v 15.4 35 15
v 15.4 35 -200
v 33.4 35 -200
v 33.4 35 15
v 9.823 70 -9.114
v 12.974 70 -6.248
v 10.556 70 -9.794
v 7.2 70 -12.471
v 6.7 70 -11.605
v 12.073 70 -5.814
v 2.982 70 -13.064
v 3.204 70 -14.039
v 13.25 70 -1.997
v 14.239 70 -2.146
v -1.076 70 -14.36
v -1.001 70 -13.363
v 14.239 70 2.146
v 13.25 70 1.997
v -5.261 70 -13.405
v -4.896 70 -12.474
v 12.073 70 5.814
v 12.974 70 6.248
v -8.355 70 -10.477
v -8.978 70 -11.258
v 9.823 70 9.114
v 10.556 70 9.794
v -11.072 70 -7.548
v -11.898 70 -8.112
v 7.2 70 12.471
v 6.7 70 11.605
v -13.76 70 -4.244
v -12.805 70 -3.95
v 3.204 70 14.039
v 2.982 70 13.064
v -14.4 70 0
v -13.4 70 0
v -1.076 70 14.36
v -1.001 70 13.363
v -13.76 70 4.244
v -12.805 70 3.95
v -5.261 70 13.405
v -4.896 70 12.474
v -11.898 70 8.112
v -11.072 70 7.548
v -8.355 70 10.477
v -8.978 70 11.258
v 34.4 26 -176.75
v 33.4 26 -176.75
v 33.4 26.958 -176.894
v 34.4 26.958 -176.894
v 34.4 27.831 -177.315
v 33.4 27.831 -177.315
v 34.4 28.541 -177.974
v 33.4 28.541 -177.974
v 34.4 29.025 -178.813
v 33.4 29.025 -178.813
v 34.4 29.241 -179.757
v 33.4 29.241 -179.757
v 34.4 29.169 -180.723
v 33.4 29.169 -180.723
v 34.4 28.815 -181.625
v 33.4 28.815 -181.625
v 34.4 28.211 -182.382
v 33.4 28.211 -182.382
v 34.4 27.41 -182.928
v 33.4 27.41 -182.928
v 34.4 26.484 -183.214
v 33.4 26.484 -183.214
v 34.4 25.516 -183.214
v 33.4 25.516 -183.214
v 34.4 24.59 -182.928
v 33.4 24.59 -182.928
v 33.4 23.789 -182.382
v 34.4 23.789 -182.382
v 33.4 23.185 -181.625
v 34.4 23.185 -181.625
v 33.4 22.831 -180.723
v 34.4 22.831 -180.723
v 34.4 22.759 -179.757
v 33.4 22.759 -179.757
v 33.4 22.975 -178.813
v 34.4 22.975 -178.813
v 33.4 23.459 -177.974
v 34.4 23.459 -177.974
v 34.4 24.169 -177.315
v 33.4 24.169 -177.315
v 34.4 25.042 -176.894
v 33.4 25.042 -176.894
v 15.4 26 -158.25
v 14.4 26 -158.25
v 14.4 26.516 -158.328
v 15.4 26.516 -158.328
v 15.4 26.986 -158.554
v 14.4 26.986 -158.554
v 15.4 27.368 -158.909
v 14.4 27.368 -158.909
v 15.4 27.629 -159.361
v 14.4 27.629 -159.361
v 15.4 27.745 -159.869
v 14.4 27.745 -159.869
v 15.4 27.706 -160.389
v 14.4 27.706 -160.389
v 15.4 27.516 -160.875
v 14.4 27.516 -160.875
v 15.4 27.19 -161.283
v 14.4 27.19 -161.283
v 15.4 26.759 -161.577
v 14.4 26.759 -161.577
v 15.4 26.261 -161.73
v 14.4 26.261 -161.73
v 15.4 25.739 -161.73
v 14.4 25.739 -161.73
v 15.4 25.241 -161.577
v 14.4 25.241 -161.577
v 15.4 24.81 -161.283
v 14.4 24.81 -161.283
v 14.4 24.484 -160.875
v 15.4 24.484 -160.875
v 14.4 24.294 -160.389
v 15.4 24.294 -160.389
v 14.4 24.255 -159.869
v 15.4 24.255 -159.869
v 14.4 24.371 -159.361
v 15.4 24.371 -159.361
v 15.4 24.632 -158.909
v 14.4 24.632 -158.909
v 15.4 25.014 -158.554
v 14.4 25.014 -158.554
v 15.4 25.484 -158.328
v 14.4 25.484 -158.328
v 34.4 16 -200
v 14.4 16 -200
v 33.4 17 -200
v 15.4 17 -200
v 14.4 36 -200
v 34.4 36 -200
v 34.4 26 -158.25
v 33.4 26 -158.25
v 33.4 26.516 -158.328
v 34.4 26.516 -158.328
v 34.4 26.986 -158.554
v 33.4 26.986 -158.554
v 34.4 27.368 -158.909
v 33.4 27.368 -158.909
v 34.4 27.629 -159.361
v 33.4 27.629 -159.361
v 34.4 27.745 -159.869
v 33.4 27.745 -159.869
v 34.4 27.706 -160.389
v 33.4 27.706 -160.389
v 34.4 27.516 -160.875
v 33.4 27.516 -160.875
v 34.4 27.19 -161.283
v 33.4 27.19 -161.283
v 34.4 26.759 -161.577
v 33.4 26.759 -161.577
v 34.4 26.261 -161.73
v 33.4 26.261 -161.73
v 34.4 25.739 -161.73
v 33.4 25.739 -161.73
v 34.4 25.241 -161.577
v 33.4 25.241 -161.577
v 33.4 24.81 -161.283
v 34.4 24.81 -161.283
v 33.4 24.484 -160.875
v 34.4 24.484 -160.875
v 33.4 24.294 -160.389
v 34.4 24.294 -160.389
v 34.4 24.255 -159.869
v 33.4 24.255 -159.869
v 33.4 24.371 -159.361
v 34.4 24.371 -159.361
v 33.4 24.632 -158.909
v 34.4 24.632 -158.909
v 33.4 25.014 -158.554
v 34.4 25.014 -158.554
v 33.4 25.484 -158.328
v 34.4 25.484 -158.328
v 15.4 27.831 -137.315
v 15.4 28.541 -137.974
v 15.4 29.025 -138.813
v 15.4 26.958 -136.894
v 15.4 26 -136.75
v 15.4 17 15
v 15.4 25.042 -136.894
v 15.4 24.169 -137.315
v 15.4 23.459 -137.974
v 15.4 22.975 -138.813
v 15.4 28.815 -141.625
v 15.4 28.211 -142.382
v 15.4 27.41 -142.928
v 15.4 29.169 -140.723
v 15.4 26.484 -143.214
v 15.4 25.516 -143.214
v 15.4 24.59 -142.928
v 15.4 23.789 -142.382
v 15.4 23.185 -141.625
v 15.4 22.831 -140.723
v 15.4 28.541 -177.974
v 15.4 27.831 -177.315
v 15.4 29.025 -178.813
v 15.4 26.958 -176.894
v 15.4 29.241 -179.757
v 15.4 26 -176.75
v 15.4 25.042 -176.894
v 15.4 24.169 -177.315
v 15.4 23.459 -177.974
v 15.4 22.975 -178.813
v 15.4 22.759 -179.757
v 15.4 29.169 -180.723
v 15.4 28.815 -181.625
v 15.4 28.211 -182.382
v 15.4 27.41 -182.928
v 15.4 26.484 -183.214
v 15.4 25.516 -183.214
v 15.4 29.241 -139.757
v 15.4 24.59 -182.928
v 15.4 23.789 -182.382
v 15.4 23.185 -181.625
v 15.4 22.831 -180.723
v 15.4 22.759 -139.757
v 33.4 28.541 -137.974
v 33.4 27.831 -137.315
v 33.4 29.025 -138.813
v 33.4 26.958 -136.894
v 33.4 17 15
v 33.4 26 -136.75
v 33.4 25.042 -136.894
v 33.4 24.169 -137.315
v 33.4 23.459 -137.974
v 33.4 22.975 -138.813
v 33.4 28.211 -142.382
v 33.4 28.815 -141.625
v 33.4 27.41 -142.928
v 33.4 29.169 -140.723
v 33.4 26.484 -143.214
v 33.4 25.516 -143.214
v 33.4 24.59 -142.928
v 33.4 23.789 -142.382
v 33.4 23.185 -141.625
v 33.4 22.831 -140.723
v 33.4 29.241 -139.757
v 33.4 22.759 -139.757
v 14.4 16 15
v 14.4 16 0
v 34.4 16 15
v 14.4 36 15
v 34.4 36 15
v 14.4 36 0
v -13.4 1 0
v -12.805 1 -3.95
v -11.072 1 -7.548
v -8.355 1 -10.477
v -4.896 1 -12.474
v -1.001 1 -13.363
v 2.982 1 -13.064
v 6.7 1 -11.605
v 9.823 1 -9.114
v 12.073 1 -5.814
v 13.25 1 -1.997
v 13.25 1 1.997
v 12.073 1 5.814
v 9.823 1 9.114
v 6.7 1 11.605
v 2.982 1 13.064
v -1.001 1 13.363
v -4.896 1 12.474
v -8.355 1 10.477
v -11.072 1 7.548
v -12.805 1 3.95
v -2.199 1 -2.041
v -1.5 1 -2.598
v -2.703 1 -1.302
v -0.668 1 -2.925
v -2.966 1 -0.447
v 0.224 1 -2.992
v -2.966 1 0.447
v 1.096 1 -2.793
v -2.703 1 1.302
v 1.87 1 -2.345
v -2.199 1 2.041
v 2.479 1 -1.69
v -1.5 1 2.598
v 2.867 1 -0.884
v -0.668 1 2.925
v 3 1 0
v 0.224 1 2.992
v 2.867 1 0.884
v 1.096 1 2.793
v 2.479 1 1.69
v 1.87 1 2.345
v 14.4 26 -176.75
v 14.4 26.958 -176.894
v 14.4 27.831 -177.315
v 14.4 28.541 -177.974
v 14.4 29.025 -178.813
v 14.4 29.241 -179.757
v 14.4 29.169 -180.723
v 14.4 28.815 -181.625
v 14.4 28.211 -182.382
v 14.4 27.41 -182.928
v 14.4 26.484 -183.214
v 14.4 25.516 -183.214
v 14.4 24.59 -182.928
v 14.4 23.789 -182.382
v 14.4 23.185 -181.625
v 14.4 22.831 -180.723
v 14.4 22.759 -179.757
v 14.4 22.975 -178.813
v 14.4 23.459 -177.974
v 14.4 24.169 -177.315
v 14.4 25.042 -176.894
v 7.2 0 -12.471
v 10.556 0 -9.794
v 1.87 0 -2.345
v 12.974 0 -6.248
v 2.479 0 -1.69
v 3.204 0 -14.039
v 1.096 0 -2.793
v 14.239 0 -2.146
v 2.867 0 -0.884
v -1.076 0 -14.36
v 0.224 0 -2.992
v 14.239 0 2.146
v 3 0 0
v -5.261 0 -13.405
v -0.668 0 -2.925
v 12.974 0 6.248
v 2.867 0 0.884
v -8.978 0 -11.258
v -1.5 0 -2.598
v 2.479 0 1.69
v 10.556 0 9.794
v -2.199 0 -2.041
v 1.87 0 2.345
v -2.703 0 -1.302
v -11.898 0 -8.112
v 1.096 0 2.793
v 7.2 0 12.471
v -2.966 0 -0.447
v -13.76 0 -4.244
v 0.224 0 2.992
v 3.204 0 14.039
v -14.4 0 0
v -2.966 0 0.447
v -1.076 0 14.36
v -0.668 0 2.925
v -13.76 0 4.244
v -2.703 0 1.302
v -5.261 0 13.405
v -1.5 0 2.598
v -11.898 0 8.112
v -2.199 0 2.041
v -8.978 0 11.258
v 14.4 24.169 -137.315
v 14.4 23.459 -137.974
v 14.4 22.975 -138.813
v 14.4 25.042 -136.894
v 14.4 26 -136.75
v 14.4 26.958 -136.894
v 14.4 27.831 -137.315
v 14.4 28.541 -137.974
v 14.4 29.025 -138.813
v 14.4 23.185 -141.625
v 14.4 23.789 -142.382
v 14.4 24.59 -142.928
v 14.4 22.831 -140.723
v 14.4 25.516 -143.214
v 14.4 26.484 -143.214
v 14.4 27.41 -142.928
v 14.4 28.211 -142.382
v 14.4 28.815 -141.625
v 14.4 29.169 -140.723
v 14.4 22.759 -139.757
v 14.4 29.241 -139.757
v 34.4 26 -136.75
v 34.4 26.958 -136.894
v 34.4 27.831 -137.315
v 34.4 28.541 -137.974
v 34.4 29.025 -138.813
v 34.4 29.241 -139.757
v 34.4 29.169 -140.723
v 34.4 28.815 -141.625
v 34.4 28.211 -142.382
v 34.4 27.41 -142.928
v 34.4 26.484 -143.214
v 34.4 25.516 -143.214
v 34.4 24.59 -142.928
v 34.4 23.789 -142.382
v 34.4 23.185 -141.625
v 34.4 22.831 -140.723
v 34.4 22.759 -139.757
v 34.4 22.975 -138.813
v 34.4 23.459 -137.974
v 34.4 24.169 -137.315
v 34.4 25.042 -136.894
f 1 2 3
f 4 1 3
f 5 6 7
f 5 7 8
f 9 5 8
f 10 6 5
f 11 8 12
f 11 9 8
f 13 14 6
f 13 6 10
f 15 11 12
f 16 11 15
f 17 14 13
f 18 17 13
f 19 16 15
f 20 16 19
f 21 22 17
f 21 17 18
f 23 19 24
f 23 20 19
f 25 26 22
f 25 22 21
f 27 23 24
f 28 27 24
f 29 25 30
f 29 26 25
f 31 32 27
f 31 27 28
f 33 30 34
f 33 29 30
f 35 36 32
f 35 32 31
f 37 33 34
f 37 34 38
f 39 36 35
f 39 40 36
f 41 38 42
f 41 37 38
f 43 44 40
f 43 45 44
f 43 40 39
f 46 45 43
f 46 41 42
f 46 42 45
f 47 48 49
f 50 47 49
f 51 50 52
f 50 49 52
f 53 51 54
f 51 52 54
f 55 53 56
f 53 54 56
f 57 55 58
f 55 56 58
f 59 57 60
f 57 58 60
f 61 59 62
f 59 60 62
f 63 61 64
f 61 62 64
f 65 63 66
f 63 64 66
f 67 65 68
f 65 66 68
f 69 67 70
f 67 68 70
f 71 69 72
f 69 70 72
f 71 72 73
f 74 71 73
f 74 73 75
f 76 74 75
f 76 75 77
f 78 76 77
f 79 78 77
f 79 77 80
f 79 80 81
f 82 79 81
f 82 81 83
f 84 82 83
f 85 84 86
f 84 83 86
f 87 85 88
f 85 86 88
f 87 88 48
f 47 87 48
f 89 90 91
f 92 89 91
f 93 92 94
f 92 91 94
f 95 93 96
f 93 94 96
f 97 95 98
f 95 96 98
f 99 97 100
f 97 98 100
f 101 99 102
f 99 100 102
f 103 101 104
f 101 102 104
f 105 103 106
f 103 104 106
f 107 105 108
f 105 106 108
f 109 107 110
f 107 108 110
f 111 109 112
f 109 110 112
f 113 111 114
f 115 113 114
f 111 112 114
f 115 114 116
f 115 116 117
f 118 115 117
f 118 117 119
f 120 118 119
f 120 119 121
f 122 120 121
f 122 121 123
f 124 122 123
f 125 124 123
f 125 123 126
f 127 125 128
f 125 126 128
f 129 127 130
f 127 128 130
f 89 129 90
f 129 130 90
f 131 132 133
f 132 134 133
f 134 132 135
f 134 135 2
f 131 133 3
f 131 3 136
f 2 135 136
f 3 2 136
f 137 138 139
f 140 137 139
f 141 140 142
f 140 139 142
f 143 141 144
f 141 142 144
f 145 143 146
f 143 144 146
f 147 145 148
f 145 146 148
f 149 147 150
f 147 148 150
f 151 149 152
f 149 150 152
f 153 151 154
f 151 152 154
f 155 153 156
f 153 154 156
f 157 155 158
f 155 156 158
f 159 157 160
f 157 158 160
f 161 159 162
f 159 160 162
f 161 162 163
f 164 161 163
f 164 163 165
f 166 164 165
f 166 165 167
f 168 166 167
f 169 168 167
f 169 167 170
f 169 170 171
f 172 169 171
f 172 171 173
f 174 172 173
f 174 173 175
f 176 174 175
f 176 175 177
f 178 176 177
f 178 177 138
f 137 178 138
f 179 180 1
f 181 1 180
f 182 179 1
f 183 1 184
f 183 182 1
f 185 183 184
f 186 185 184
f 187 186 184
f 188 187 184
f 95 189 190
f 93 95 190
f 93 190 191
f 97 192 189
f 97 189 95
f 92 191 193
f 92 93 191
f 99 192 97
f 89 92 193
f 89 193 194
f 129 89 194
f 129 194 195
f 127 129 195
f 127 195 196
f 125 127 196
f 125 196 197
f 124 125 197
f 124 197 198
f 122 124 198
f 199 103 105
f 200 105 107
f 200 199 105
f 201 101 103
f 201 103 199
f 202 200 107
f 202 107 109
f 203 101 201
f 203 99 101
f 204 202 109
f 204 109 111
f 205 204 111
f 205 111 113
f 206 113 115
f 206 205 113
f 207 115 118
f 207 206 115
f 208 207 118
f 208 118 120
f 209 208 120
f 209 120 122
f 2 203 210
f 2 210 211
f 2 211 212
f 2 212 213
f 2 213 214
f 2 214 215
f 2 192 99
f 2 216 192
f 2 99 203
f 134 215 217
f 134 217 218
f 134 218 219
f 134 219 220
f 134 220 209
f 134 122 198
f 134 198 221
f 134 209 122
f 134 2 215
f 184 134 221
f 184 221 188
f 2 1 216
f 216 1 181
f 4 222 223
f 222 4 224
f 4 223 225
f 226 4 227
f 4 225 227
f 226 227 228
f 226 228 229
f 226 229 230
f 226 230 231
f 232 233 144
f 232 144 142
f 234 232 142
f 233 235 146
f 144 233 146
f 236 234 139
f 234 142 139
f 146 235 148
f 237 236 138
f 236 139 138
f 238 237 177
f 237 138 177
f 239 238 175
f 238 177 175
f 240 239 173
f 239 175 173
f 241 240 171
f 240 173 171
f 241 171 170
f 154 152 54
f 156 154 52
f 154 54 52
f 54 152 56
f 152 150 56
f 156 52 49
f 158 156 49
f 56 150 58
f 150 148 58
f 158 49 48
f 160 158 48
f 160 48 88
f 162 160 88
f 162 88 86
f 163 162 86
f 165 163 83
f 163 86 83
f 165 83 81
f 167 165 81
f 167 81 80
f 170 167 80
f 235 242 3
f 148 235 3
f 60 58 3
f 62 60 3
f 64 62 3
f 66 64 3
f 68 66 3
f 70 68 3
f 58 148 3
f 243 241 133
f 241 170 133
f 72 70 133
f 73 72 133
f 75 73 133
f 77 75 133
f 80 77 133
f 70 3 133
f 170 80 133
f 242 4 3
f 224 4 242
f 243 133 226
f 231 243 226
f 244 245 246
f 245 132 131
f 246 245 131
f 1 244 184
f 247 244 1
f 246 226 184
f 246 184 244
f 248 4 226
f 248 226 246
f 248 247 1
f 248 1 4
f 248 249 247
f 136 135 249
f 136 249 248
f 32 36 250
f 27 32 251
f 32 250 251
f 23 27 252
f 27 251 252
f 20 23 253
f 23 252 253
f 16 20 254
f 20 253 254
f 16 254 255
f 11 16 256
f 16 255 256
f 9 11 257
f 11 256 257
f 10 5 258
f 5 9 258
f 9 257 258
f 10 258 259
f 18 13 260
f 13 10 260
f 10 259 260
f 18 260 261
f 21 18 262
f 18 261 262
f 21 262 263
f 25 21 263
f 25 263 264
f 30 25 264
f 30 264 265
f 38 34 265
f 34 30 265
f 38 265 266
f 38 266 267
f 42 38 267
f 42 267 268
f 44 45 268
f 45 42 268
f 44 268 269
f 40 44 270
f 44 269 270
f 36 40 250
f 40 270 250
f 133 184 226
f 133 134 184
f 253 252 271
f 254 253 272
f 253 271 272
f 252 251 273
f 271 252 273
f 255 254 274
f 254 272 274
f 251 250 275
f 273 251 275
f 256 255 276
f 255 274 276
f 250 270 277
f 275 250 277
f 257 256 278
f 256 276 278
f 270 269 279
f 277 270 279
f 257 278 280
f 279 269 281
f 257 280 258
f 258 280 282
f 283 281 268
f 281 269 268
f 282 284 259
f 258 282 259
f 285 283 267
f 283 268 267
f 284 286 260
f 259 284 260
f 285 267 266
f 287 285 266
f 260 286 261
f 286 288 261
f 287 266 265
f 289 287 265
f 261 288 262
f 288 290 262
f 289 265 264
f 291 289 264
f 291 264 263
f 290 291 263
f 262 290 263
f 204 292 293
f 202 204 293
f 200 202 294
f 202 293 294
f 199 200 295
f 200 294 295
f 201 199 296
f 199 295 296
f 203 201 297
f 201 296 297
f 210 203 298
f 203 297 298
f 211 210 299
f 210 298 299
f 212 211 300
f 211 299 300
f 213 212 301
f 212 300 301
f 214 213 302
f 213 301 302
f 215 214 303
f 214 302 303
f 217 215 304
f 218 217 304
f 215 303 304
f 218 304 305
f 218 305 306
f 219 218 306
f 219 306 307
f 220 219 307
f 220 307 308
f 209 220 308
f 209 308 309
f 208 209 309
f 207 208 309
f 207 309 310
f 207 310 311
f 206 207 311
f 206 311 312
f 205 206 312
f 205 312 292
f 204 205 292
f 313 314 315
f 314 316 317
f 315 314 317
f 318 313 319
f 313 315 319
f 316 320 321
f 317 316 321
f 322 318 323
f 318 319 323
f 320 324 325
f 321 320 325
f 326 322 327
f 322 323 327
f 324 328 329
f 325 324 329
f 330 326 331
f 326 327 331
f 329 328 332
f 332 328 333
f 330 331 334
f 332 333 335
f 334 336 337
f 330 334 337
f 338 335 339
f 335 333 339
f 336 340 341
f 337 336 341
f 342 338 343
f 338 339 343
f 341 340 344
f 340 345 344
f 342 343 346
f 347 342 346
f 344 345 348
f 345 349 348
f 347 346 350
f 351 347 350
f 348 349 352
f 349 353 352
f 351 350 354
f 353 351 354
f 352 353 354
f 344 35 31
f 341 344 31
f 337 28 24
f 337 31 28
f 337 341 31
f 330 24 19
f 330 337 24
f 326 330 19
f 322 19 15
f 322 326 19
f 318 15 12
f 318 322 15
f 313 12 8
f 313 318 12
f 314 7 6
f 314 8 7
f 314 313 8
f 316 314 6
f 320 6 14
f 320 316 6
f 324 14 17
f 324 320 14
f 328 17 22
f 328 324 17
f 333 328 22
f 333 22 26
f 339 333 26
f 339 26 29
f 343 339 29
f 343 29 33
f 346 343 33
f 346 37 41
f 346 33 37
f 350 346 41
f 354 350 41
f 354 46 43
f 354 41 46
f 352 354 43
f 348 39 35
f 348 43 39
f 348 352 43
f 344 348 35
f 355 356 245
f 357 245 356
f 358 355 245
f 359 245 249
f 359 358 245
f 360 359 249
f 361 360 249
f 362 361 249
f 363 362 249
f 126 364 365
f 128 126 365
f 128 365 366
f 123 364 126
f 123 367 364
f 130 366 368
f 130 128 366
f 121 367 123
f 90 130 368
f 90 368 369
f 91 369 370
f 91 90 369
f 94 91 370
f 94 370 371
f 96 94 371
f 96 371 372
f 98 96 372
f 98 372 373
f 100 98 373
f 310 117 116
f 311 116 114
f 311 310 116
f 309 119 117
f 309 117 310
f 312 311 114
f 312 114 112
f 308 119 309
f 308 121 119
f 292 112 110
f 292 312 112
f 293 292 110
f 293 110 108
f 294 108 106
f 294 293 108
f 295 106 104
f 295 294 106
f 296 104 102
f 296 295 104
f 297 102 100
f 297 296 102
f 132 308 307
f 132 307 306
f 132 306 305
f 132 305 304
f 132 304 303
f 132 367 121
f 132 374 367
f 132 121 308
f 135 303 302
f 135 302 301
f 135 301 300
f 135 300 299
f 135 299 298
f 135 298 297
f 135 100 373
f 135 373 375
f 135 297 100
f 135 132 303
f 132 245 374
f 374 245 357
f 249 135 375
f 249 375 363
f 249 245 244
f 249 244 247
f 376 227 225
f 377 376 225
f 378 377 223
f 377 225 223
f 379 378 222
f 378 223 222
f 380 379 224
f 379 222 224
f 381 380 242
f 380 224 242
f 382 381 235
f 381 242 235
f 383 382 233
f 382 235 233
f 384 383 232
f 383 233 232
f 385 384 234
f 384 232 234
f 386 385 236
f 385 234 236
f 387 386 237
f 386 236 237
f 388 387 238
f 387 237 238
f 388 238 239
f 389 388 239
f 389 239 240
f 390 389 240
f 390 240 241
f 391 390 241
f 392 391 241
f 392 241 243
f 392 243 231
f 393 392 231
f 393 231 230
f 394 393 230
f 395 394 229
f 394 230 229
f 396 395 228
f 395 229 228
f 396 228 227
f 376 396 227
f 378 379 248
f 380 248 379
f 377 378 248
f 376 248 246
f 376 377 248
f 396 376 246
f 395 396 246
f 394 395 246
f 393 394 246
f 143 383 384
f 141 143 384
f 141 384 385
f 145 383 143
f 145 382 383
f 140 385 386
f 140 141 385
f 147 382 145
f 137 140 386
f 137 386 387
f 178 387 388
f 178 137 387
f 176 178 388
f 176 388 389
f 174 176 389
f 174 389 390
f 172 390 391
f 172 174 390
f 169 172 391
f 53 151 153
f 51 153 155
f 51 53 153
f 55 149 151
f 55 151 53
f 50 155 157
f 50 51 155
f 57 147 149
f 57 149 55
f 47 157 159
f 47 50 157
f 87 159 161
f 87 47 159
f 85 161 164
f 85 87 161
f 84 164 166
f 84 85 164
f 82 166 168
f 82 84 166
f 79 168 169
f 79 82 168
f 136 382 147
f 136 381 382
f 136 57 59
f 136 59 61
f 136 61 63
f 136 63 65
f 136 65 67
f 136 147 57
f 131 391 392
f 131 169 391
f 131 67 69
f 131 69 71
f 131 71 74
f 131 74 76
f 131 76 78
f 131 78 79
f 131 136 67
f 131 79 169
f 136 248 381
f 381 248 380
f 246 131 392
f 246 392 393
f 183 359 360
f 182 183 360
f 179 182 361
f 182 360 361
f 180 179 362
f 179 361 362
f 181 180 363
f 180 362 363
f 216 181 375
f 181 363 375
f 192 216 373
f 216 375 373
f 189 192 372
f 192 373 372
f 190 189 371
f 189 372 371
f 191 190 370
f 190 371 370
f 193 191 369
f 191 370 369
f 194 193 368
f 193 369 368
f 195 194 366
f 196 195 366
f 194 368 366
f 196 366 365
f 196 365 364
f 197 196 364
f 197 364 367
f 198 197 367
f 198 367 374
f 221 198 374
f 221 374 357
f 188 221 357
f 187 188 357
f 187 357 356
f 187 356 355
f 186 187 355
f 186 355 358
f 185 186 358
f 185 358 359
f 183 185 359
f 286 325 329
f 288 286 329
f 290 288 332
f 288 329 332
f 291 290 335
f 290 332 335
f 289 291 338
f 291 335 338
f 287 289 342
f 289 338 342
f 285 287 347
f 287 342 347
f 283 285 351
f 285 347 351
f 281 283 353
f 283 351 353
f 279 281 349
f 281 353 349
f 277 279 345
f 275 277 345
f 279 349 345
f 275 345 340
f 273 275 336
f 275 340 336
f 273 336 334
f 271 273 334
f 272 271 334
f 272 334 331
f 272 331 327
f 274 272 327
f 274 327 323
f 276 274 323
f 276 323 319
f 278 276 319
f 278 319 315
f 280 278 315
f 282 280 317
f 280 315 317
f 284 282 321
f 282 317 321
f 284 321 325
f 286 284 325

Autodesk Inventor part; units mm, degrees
ref_plane "YZ Plane" through (0, 0, 0) normal (1, 0, 0) x (0, 1, 0)
ref_plane "XZ Plane" through (0, 0, 0) normal (0, 1, 0) x (-1, 0, 0)
sketch "Esboço1" plane through (0, 0, 0) normal (0, 1, 0) x (-1, 0, 0)
  circle A0 centre (0, 0) radius 14.4
  circle A1 centre (0, 0) radius 13.4
  dimension "d0" = 28.8
  dimension "d1" = 1
extrude "Extrusão1" add sketch "Esboço1" along normal blind 70
sketch "Esboço2" plane through (0, 0, 0) normal (0, -1, 0) x (1, 0, 0)
  circle A0 centre (0, 0) radius 14.4
extrude "Extrusão2" add sketch "Esboço2" against normal blind 1
ref_plane "Plano de trabalho1" through (0, 0, 14.4) normal (0, 0, 1) x (1, 0, 0)
sketch "Esboço3" plane through (0, 0, 0) normal (0, 0, 1) x (1, 0, 0)
  line L0 (-14.4, 0) -> (14.4, 0) projected
  line L1 (14.4, 0) -> (14.4, 16)
  line L2 (14.4, 0) -> (14.4, 70) projected
  line L3 (14.4, 16) -> (34.4, 16)
  line L4 (14.4, 36) -> (14.4, 16)
  line L5 (34.4, 16) -> (14.4, 16)
  line L6 (14.4, 16) -> (14.4, 36)
  line L7 (14.4, 36) -> (34.4, 36)
  line L8 (34.4, 36) -> (34.4, 16)
  line L9 (34.4, 16) -> (14.4, 16)
  line L10 (14.4, 16) -> (14.4, 36)
  line L11 (15.4, 35) -> (33.4, 35)
  line L12 (33.4, 35) -> (33.4, 17)
  line L13 (15.4, 17) -> (33.4, 17)
  line L14 (15.4, 36) -> (15.4, 16)
  point P0 (0, 0)
  dimension "d7" = 16
  dimension "d8" = 20
  dimension "d11" = 1
  dimension "d12" = 1
  dimension "d13" = 1
extrude "Extrusão3" add sketch "Esboço3" along normal blind 15 and the other way blind 200 contours L2 L7 L14 L3 | L14 L13 L12 L11 L7 L8 L3
sketch "Esboço4" plane through (0, 0, 0) normal (0, -1, 0) x (1, 0, 0)
  circle A0 centre (0, 0) radius 3
  dimension "d18" = 6
extrude "Extrusão4" cut sketch "Esboço4" against normal blind 15
sketch "Esboço5" plane through (14.4, 16, 0) normal (-1, 0, 0) x (0, 0, 1)
  line L0 (-200, 1) -> (-200, 19) projected
  line L1 (-200, 10) -> (-180, 10)
  line L2 (-180, 10) -> (-140, 10)
  circle A0 centre (-180, 10) radius 3.25
  circle A1 centre (-140, 10) radius 3.25
  point P0 (0, -16)
  dimension "d21" = 20
  dimension "d22" = 40
  dimension "d23" = 6.5
  dimension "d24" = 6.5
extrude "Extrusão5" cut sketch "Esboço5" against normal blind 30
sketch "Esboço6" plane through (14.4, 16, 0) normal (-1, 0, 0) x (0, 0, 1)
  circle A0 centre (-180, 10) radius 3.25 projected
  circle A1 centre (-140, 10) radius 3.25 projected
  line L0 (-180, 10) -> (-140, 10)
  circle A2 centre (-160, 10) radius 1.75
  point P0 (0, -16)
  dimension "d27" = 3.5
extrude "Extrusão6" cut sketch "Esboço6" against normal blind 30 contours A2 L0 | L0 A2
properties part number "base e suporte"
